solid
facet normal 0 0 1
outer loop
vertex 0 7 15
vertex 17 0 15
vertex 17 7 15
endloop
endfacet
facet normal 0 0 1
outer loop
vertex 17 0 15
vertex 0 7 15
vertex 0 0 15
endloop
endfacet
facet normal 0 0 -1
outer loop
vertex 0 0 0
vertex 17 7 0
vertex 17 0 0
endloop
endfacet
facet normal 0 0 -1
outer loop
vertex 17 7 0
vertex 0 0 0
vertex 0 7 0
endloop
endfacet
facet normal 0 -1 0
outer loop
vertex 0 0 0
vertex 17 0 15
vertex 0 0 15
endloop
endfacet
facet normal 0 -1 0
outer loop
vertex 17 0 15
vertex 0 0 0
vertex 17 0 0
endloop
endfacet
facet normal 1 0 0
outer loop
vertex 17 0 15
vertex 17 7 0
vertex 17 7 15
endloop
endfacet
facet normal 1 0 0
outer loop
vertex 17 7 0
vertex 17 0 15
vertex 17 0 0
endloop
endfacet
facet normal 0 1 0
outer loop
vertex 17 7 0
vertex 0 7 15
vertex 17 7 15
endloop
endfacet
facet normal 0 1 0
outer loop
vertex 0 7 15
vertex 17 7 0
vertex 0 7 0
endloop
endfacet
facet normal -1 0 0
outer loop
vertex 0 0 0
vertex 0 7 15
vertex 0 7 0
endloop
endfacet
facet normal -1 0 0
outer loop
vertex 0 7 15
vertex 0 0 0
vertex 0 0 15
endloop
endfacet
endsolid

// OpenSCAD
// Generated by SolidPython 1.0.1 on 2020-07-29 00:46:56


cube(size = [17, 7, 15]);
/***********************************************
*********      SolidPython code:      **********
************************************************
 
# import packages: SolidPython
from solid import *
from solid.utils import *
from itertools import chain, combinations, permutations


class Resize:

    def __init__(self, scad_file):
        self.scad_file = scad_file
        #self.scad_file = import_scad(scad_file)
        # cone/cylinder param:
        self.r1 = 0
        self.r2 = 0
        self.h = 0
        # rectangular prism param:
        self.w = 0
        self.l = 0
        # ellipse param:
        self.r = 0

    # import OpenScad code (file name corresponds to shape)


    # classify shape + parameters
    def assign(self, param1, param2, param3):
        if self.scad_file == 'cone.scad':
            self.r1 = param1
            self.r2 = param2
            self.h = param3
        elif self.scad_file == 'cylinder.scad':
            self.r1 = param1
            self.r2 = param2
            self.h = param3
        elif self.scad_file == 'rectangularPrism.scad':
            self.h = param1
            self.l = param2
            self.w = param3
        else:
            self.r = param1
            self.h = param2

    # resize parameters
    def iterate(self):
        x = range(3, 20, 2)
        i = 1
        if self.scad_file == 'cone.scad':
            tempList = list(permutations(x, 2))
            for temp in tempList:
                param1 = temp[0]
                param2 = temp[1]
                filepath = 'produced_scad_files/' + 'cone' + str(param1) + '_' + str(param2) + '_' + '.scad'
                scad_render_to_file(cylinder(h=param1, r1=param2, r2=0), filepath)

        elif self.scad_file == 'cylinder.scad':
            tempList = list(permutations(x, 3))
            for temp in tempList:
                param1 = temp[0]
                param2 = temp[1]
                filepath = 'produced_scad_files/' + 'cylinder' + str(param1) + '_' + str(param2) + '_' + '.scad'
                scad_render_to_file(cylinder(h=param1, r1=param2, r2=param2), filepath)

        elif self.scad_file == 'rectangularPrism.scad':
            tempList = list(permutations(x, 3))
            for temp in tempList:
                param1 = temp[0]
                param2 = temp[1]
                param3 = temp[2]
                filepath = 'produced_scad_files/' + 'rectangularPrism' + str(param1) + '_' + str(param2) + '_' + str(
                    param3) + '.scad'
                scad_render_to_file(cube(size=(param1, param2, param3)), filepath)

        elif self.scad_file == 'ellipse.scad':
            tempList = list(permutations(x, 4))
            for temp in tempList:
                param1 = temp[0]
                param2 = temp[1]
                param3 = temp[2]
                param4 = temp[3]
                filepath = 'produced_scad_files/' + 'ellipse' + str(param1) + '_' + str(param2) + '_' + str(param3) + '_' + str(param4) + '.scad'
                scad_render_to_file(scale([param1, param2, param3])(sphere(r=param4)), filepath)

    def render_to_scadfile(self):
        scad_render_to_file(scad, 'example.scad') 
 
************************************************/
